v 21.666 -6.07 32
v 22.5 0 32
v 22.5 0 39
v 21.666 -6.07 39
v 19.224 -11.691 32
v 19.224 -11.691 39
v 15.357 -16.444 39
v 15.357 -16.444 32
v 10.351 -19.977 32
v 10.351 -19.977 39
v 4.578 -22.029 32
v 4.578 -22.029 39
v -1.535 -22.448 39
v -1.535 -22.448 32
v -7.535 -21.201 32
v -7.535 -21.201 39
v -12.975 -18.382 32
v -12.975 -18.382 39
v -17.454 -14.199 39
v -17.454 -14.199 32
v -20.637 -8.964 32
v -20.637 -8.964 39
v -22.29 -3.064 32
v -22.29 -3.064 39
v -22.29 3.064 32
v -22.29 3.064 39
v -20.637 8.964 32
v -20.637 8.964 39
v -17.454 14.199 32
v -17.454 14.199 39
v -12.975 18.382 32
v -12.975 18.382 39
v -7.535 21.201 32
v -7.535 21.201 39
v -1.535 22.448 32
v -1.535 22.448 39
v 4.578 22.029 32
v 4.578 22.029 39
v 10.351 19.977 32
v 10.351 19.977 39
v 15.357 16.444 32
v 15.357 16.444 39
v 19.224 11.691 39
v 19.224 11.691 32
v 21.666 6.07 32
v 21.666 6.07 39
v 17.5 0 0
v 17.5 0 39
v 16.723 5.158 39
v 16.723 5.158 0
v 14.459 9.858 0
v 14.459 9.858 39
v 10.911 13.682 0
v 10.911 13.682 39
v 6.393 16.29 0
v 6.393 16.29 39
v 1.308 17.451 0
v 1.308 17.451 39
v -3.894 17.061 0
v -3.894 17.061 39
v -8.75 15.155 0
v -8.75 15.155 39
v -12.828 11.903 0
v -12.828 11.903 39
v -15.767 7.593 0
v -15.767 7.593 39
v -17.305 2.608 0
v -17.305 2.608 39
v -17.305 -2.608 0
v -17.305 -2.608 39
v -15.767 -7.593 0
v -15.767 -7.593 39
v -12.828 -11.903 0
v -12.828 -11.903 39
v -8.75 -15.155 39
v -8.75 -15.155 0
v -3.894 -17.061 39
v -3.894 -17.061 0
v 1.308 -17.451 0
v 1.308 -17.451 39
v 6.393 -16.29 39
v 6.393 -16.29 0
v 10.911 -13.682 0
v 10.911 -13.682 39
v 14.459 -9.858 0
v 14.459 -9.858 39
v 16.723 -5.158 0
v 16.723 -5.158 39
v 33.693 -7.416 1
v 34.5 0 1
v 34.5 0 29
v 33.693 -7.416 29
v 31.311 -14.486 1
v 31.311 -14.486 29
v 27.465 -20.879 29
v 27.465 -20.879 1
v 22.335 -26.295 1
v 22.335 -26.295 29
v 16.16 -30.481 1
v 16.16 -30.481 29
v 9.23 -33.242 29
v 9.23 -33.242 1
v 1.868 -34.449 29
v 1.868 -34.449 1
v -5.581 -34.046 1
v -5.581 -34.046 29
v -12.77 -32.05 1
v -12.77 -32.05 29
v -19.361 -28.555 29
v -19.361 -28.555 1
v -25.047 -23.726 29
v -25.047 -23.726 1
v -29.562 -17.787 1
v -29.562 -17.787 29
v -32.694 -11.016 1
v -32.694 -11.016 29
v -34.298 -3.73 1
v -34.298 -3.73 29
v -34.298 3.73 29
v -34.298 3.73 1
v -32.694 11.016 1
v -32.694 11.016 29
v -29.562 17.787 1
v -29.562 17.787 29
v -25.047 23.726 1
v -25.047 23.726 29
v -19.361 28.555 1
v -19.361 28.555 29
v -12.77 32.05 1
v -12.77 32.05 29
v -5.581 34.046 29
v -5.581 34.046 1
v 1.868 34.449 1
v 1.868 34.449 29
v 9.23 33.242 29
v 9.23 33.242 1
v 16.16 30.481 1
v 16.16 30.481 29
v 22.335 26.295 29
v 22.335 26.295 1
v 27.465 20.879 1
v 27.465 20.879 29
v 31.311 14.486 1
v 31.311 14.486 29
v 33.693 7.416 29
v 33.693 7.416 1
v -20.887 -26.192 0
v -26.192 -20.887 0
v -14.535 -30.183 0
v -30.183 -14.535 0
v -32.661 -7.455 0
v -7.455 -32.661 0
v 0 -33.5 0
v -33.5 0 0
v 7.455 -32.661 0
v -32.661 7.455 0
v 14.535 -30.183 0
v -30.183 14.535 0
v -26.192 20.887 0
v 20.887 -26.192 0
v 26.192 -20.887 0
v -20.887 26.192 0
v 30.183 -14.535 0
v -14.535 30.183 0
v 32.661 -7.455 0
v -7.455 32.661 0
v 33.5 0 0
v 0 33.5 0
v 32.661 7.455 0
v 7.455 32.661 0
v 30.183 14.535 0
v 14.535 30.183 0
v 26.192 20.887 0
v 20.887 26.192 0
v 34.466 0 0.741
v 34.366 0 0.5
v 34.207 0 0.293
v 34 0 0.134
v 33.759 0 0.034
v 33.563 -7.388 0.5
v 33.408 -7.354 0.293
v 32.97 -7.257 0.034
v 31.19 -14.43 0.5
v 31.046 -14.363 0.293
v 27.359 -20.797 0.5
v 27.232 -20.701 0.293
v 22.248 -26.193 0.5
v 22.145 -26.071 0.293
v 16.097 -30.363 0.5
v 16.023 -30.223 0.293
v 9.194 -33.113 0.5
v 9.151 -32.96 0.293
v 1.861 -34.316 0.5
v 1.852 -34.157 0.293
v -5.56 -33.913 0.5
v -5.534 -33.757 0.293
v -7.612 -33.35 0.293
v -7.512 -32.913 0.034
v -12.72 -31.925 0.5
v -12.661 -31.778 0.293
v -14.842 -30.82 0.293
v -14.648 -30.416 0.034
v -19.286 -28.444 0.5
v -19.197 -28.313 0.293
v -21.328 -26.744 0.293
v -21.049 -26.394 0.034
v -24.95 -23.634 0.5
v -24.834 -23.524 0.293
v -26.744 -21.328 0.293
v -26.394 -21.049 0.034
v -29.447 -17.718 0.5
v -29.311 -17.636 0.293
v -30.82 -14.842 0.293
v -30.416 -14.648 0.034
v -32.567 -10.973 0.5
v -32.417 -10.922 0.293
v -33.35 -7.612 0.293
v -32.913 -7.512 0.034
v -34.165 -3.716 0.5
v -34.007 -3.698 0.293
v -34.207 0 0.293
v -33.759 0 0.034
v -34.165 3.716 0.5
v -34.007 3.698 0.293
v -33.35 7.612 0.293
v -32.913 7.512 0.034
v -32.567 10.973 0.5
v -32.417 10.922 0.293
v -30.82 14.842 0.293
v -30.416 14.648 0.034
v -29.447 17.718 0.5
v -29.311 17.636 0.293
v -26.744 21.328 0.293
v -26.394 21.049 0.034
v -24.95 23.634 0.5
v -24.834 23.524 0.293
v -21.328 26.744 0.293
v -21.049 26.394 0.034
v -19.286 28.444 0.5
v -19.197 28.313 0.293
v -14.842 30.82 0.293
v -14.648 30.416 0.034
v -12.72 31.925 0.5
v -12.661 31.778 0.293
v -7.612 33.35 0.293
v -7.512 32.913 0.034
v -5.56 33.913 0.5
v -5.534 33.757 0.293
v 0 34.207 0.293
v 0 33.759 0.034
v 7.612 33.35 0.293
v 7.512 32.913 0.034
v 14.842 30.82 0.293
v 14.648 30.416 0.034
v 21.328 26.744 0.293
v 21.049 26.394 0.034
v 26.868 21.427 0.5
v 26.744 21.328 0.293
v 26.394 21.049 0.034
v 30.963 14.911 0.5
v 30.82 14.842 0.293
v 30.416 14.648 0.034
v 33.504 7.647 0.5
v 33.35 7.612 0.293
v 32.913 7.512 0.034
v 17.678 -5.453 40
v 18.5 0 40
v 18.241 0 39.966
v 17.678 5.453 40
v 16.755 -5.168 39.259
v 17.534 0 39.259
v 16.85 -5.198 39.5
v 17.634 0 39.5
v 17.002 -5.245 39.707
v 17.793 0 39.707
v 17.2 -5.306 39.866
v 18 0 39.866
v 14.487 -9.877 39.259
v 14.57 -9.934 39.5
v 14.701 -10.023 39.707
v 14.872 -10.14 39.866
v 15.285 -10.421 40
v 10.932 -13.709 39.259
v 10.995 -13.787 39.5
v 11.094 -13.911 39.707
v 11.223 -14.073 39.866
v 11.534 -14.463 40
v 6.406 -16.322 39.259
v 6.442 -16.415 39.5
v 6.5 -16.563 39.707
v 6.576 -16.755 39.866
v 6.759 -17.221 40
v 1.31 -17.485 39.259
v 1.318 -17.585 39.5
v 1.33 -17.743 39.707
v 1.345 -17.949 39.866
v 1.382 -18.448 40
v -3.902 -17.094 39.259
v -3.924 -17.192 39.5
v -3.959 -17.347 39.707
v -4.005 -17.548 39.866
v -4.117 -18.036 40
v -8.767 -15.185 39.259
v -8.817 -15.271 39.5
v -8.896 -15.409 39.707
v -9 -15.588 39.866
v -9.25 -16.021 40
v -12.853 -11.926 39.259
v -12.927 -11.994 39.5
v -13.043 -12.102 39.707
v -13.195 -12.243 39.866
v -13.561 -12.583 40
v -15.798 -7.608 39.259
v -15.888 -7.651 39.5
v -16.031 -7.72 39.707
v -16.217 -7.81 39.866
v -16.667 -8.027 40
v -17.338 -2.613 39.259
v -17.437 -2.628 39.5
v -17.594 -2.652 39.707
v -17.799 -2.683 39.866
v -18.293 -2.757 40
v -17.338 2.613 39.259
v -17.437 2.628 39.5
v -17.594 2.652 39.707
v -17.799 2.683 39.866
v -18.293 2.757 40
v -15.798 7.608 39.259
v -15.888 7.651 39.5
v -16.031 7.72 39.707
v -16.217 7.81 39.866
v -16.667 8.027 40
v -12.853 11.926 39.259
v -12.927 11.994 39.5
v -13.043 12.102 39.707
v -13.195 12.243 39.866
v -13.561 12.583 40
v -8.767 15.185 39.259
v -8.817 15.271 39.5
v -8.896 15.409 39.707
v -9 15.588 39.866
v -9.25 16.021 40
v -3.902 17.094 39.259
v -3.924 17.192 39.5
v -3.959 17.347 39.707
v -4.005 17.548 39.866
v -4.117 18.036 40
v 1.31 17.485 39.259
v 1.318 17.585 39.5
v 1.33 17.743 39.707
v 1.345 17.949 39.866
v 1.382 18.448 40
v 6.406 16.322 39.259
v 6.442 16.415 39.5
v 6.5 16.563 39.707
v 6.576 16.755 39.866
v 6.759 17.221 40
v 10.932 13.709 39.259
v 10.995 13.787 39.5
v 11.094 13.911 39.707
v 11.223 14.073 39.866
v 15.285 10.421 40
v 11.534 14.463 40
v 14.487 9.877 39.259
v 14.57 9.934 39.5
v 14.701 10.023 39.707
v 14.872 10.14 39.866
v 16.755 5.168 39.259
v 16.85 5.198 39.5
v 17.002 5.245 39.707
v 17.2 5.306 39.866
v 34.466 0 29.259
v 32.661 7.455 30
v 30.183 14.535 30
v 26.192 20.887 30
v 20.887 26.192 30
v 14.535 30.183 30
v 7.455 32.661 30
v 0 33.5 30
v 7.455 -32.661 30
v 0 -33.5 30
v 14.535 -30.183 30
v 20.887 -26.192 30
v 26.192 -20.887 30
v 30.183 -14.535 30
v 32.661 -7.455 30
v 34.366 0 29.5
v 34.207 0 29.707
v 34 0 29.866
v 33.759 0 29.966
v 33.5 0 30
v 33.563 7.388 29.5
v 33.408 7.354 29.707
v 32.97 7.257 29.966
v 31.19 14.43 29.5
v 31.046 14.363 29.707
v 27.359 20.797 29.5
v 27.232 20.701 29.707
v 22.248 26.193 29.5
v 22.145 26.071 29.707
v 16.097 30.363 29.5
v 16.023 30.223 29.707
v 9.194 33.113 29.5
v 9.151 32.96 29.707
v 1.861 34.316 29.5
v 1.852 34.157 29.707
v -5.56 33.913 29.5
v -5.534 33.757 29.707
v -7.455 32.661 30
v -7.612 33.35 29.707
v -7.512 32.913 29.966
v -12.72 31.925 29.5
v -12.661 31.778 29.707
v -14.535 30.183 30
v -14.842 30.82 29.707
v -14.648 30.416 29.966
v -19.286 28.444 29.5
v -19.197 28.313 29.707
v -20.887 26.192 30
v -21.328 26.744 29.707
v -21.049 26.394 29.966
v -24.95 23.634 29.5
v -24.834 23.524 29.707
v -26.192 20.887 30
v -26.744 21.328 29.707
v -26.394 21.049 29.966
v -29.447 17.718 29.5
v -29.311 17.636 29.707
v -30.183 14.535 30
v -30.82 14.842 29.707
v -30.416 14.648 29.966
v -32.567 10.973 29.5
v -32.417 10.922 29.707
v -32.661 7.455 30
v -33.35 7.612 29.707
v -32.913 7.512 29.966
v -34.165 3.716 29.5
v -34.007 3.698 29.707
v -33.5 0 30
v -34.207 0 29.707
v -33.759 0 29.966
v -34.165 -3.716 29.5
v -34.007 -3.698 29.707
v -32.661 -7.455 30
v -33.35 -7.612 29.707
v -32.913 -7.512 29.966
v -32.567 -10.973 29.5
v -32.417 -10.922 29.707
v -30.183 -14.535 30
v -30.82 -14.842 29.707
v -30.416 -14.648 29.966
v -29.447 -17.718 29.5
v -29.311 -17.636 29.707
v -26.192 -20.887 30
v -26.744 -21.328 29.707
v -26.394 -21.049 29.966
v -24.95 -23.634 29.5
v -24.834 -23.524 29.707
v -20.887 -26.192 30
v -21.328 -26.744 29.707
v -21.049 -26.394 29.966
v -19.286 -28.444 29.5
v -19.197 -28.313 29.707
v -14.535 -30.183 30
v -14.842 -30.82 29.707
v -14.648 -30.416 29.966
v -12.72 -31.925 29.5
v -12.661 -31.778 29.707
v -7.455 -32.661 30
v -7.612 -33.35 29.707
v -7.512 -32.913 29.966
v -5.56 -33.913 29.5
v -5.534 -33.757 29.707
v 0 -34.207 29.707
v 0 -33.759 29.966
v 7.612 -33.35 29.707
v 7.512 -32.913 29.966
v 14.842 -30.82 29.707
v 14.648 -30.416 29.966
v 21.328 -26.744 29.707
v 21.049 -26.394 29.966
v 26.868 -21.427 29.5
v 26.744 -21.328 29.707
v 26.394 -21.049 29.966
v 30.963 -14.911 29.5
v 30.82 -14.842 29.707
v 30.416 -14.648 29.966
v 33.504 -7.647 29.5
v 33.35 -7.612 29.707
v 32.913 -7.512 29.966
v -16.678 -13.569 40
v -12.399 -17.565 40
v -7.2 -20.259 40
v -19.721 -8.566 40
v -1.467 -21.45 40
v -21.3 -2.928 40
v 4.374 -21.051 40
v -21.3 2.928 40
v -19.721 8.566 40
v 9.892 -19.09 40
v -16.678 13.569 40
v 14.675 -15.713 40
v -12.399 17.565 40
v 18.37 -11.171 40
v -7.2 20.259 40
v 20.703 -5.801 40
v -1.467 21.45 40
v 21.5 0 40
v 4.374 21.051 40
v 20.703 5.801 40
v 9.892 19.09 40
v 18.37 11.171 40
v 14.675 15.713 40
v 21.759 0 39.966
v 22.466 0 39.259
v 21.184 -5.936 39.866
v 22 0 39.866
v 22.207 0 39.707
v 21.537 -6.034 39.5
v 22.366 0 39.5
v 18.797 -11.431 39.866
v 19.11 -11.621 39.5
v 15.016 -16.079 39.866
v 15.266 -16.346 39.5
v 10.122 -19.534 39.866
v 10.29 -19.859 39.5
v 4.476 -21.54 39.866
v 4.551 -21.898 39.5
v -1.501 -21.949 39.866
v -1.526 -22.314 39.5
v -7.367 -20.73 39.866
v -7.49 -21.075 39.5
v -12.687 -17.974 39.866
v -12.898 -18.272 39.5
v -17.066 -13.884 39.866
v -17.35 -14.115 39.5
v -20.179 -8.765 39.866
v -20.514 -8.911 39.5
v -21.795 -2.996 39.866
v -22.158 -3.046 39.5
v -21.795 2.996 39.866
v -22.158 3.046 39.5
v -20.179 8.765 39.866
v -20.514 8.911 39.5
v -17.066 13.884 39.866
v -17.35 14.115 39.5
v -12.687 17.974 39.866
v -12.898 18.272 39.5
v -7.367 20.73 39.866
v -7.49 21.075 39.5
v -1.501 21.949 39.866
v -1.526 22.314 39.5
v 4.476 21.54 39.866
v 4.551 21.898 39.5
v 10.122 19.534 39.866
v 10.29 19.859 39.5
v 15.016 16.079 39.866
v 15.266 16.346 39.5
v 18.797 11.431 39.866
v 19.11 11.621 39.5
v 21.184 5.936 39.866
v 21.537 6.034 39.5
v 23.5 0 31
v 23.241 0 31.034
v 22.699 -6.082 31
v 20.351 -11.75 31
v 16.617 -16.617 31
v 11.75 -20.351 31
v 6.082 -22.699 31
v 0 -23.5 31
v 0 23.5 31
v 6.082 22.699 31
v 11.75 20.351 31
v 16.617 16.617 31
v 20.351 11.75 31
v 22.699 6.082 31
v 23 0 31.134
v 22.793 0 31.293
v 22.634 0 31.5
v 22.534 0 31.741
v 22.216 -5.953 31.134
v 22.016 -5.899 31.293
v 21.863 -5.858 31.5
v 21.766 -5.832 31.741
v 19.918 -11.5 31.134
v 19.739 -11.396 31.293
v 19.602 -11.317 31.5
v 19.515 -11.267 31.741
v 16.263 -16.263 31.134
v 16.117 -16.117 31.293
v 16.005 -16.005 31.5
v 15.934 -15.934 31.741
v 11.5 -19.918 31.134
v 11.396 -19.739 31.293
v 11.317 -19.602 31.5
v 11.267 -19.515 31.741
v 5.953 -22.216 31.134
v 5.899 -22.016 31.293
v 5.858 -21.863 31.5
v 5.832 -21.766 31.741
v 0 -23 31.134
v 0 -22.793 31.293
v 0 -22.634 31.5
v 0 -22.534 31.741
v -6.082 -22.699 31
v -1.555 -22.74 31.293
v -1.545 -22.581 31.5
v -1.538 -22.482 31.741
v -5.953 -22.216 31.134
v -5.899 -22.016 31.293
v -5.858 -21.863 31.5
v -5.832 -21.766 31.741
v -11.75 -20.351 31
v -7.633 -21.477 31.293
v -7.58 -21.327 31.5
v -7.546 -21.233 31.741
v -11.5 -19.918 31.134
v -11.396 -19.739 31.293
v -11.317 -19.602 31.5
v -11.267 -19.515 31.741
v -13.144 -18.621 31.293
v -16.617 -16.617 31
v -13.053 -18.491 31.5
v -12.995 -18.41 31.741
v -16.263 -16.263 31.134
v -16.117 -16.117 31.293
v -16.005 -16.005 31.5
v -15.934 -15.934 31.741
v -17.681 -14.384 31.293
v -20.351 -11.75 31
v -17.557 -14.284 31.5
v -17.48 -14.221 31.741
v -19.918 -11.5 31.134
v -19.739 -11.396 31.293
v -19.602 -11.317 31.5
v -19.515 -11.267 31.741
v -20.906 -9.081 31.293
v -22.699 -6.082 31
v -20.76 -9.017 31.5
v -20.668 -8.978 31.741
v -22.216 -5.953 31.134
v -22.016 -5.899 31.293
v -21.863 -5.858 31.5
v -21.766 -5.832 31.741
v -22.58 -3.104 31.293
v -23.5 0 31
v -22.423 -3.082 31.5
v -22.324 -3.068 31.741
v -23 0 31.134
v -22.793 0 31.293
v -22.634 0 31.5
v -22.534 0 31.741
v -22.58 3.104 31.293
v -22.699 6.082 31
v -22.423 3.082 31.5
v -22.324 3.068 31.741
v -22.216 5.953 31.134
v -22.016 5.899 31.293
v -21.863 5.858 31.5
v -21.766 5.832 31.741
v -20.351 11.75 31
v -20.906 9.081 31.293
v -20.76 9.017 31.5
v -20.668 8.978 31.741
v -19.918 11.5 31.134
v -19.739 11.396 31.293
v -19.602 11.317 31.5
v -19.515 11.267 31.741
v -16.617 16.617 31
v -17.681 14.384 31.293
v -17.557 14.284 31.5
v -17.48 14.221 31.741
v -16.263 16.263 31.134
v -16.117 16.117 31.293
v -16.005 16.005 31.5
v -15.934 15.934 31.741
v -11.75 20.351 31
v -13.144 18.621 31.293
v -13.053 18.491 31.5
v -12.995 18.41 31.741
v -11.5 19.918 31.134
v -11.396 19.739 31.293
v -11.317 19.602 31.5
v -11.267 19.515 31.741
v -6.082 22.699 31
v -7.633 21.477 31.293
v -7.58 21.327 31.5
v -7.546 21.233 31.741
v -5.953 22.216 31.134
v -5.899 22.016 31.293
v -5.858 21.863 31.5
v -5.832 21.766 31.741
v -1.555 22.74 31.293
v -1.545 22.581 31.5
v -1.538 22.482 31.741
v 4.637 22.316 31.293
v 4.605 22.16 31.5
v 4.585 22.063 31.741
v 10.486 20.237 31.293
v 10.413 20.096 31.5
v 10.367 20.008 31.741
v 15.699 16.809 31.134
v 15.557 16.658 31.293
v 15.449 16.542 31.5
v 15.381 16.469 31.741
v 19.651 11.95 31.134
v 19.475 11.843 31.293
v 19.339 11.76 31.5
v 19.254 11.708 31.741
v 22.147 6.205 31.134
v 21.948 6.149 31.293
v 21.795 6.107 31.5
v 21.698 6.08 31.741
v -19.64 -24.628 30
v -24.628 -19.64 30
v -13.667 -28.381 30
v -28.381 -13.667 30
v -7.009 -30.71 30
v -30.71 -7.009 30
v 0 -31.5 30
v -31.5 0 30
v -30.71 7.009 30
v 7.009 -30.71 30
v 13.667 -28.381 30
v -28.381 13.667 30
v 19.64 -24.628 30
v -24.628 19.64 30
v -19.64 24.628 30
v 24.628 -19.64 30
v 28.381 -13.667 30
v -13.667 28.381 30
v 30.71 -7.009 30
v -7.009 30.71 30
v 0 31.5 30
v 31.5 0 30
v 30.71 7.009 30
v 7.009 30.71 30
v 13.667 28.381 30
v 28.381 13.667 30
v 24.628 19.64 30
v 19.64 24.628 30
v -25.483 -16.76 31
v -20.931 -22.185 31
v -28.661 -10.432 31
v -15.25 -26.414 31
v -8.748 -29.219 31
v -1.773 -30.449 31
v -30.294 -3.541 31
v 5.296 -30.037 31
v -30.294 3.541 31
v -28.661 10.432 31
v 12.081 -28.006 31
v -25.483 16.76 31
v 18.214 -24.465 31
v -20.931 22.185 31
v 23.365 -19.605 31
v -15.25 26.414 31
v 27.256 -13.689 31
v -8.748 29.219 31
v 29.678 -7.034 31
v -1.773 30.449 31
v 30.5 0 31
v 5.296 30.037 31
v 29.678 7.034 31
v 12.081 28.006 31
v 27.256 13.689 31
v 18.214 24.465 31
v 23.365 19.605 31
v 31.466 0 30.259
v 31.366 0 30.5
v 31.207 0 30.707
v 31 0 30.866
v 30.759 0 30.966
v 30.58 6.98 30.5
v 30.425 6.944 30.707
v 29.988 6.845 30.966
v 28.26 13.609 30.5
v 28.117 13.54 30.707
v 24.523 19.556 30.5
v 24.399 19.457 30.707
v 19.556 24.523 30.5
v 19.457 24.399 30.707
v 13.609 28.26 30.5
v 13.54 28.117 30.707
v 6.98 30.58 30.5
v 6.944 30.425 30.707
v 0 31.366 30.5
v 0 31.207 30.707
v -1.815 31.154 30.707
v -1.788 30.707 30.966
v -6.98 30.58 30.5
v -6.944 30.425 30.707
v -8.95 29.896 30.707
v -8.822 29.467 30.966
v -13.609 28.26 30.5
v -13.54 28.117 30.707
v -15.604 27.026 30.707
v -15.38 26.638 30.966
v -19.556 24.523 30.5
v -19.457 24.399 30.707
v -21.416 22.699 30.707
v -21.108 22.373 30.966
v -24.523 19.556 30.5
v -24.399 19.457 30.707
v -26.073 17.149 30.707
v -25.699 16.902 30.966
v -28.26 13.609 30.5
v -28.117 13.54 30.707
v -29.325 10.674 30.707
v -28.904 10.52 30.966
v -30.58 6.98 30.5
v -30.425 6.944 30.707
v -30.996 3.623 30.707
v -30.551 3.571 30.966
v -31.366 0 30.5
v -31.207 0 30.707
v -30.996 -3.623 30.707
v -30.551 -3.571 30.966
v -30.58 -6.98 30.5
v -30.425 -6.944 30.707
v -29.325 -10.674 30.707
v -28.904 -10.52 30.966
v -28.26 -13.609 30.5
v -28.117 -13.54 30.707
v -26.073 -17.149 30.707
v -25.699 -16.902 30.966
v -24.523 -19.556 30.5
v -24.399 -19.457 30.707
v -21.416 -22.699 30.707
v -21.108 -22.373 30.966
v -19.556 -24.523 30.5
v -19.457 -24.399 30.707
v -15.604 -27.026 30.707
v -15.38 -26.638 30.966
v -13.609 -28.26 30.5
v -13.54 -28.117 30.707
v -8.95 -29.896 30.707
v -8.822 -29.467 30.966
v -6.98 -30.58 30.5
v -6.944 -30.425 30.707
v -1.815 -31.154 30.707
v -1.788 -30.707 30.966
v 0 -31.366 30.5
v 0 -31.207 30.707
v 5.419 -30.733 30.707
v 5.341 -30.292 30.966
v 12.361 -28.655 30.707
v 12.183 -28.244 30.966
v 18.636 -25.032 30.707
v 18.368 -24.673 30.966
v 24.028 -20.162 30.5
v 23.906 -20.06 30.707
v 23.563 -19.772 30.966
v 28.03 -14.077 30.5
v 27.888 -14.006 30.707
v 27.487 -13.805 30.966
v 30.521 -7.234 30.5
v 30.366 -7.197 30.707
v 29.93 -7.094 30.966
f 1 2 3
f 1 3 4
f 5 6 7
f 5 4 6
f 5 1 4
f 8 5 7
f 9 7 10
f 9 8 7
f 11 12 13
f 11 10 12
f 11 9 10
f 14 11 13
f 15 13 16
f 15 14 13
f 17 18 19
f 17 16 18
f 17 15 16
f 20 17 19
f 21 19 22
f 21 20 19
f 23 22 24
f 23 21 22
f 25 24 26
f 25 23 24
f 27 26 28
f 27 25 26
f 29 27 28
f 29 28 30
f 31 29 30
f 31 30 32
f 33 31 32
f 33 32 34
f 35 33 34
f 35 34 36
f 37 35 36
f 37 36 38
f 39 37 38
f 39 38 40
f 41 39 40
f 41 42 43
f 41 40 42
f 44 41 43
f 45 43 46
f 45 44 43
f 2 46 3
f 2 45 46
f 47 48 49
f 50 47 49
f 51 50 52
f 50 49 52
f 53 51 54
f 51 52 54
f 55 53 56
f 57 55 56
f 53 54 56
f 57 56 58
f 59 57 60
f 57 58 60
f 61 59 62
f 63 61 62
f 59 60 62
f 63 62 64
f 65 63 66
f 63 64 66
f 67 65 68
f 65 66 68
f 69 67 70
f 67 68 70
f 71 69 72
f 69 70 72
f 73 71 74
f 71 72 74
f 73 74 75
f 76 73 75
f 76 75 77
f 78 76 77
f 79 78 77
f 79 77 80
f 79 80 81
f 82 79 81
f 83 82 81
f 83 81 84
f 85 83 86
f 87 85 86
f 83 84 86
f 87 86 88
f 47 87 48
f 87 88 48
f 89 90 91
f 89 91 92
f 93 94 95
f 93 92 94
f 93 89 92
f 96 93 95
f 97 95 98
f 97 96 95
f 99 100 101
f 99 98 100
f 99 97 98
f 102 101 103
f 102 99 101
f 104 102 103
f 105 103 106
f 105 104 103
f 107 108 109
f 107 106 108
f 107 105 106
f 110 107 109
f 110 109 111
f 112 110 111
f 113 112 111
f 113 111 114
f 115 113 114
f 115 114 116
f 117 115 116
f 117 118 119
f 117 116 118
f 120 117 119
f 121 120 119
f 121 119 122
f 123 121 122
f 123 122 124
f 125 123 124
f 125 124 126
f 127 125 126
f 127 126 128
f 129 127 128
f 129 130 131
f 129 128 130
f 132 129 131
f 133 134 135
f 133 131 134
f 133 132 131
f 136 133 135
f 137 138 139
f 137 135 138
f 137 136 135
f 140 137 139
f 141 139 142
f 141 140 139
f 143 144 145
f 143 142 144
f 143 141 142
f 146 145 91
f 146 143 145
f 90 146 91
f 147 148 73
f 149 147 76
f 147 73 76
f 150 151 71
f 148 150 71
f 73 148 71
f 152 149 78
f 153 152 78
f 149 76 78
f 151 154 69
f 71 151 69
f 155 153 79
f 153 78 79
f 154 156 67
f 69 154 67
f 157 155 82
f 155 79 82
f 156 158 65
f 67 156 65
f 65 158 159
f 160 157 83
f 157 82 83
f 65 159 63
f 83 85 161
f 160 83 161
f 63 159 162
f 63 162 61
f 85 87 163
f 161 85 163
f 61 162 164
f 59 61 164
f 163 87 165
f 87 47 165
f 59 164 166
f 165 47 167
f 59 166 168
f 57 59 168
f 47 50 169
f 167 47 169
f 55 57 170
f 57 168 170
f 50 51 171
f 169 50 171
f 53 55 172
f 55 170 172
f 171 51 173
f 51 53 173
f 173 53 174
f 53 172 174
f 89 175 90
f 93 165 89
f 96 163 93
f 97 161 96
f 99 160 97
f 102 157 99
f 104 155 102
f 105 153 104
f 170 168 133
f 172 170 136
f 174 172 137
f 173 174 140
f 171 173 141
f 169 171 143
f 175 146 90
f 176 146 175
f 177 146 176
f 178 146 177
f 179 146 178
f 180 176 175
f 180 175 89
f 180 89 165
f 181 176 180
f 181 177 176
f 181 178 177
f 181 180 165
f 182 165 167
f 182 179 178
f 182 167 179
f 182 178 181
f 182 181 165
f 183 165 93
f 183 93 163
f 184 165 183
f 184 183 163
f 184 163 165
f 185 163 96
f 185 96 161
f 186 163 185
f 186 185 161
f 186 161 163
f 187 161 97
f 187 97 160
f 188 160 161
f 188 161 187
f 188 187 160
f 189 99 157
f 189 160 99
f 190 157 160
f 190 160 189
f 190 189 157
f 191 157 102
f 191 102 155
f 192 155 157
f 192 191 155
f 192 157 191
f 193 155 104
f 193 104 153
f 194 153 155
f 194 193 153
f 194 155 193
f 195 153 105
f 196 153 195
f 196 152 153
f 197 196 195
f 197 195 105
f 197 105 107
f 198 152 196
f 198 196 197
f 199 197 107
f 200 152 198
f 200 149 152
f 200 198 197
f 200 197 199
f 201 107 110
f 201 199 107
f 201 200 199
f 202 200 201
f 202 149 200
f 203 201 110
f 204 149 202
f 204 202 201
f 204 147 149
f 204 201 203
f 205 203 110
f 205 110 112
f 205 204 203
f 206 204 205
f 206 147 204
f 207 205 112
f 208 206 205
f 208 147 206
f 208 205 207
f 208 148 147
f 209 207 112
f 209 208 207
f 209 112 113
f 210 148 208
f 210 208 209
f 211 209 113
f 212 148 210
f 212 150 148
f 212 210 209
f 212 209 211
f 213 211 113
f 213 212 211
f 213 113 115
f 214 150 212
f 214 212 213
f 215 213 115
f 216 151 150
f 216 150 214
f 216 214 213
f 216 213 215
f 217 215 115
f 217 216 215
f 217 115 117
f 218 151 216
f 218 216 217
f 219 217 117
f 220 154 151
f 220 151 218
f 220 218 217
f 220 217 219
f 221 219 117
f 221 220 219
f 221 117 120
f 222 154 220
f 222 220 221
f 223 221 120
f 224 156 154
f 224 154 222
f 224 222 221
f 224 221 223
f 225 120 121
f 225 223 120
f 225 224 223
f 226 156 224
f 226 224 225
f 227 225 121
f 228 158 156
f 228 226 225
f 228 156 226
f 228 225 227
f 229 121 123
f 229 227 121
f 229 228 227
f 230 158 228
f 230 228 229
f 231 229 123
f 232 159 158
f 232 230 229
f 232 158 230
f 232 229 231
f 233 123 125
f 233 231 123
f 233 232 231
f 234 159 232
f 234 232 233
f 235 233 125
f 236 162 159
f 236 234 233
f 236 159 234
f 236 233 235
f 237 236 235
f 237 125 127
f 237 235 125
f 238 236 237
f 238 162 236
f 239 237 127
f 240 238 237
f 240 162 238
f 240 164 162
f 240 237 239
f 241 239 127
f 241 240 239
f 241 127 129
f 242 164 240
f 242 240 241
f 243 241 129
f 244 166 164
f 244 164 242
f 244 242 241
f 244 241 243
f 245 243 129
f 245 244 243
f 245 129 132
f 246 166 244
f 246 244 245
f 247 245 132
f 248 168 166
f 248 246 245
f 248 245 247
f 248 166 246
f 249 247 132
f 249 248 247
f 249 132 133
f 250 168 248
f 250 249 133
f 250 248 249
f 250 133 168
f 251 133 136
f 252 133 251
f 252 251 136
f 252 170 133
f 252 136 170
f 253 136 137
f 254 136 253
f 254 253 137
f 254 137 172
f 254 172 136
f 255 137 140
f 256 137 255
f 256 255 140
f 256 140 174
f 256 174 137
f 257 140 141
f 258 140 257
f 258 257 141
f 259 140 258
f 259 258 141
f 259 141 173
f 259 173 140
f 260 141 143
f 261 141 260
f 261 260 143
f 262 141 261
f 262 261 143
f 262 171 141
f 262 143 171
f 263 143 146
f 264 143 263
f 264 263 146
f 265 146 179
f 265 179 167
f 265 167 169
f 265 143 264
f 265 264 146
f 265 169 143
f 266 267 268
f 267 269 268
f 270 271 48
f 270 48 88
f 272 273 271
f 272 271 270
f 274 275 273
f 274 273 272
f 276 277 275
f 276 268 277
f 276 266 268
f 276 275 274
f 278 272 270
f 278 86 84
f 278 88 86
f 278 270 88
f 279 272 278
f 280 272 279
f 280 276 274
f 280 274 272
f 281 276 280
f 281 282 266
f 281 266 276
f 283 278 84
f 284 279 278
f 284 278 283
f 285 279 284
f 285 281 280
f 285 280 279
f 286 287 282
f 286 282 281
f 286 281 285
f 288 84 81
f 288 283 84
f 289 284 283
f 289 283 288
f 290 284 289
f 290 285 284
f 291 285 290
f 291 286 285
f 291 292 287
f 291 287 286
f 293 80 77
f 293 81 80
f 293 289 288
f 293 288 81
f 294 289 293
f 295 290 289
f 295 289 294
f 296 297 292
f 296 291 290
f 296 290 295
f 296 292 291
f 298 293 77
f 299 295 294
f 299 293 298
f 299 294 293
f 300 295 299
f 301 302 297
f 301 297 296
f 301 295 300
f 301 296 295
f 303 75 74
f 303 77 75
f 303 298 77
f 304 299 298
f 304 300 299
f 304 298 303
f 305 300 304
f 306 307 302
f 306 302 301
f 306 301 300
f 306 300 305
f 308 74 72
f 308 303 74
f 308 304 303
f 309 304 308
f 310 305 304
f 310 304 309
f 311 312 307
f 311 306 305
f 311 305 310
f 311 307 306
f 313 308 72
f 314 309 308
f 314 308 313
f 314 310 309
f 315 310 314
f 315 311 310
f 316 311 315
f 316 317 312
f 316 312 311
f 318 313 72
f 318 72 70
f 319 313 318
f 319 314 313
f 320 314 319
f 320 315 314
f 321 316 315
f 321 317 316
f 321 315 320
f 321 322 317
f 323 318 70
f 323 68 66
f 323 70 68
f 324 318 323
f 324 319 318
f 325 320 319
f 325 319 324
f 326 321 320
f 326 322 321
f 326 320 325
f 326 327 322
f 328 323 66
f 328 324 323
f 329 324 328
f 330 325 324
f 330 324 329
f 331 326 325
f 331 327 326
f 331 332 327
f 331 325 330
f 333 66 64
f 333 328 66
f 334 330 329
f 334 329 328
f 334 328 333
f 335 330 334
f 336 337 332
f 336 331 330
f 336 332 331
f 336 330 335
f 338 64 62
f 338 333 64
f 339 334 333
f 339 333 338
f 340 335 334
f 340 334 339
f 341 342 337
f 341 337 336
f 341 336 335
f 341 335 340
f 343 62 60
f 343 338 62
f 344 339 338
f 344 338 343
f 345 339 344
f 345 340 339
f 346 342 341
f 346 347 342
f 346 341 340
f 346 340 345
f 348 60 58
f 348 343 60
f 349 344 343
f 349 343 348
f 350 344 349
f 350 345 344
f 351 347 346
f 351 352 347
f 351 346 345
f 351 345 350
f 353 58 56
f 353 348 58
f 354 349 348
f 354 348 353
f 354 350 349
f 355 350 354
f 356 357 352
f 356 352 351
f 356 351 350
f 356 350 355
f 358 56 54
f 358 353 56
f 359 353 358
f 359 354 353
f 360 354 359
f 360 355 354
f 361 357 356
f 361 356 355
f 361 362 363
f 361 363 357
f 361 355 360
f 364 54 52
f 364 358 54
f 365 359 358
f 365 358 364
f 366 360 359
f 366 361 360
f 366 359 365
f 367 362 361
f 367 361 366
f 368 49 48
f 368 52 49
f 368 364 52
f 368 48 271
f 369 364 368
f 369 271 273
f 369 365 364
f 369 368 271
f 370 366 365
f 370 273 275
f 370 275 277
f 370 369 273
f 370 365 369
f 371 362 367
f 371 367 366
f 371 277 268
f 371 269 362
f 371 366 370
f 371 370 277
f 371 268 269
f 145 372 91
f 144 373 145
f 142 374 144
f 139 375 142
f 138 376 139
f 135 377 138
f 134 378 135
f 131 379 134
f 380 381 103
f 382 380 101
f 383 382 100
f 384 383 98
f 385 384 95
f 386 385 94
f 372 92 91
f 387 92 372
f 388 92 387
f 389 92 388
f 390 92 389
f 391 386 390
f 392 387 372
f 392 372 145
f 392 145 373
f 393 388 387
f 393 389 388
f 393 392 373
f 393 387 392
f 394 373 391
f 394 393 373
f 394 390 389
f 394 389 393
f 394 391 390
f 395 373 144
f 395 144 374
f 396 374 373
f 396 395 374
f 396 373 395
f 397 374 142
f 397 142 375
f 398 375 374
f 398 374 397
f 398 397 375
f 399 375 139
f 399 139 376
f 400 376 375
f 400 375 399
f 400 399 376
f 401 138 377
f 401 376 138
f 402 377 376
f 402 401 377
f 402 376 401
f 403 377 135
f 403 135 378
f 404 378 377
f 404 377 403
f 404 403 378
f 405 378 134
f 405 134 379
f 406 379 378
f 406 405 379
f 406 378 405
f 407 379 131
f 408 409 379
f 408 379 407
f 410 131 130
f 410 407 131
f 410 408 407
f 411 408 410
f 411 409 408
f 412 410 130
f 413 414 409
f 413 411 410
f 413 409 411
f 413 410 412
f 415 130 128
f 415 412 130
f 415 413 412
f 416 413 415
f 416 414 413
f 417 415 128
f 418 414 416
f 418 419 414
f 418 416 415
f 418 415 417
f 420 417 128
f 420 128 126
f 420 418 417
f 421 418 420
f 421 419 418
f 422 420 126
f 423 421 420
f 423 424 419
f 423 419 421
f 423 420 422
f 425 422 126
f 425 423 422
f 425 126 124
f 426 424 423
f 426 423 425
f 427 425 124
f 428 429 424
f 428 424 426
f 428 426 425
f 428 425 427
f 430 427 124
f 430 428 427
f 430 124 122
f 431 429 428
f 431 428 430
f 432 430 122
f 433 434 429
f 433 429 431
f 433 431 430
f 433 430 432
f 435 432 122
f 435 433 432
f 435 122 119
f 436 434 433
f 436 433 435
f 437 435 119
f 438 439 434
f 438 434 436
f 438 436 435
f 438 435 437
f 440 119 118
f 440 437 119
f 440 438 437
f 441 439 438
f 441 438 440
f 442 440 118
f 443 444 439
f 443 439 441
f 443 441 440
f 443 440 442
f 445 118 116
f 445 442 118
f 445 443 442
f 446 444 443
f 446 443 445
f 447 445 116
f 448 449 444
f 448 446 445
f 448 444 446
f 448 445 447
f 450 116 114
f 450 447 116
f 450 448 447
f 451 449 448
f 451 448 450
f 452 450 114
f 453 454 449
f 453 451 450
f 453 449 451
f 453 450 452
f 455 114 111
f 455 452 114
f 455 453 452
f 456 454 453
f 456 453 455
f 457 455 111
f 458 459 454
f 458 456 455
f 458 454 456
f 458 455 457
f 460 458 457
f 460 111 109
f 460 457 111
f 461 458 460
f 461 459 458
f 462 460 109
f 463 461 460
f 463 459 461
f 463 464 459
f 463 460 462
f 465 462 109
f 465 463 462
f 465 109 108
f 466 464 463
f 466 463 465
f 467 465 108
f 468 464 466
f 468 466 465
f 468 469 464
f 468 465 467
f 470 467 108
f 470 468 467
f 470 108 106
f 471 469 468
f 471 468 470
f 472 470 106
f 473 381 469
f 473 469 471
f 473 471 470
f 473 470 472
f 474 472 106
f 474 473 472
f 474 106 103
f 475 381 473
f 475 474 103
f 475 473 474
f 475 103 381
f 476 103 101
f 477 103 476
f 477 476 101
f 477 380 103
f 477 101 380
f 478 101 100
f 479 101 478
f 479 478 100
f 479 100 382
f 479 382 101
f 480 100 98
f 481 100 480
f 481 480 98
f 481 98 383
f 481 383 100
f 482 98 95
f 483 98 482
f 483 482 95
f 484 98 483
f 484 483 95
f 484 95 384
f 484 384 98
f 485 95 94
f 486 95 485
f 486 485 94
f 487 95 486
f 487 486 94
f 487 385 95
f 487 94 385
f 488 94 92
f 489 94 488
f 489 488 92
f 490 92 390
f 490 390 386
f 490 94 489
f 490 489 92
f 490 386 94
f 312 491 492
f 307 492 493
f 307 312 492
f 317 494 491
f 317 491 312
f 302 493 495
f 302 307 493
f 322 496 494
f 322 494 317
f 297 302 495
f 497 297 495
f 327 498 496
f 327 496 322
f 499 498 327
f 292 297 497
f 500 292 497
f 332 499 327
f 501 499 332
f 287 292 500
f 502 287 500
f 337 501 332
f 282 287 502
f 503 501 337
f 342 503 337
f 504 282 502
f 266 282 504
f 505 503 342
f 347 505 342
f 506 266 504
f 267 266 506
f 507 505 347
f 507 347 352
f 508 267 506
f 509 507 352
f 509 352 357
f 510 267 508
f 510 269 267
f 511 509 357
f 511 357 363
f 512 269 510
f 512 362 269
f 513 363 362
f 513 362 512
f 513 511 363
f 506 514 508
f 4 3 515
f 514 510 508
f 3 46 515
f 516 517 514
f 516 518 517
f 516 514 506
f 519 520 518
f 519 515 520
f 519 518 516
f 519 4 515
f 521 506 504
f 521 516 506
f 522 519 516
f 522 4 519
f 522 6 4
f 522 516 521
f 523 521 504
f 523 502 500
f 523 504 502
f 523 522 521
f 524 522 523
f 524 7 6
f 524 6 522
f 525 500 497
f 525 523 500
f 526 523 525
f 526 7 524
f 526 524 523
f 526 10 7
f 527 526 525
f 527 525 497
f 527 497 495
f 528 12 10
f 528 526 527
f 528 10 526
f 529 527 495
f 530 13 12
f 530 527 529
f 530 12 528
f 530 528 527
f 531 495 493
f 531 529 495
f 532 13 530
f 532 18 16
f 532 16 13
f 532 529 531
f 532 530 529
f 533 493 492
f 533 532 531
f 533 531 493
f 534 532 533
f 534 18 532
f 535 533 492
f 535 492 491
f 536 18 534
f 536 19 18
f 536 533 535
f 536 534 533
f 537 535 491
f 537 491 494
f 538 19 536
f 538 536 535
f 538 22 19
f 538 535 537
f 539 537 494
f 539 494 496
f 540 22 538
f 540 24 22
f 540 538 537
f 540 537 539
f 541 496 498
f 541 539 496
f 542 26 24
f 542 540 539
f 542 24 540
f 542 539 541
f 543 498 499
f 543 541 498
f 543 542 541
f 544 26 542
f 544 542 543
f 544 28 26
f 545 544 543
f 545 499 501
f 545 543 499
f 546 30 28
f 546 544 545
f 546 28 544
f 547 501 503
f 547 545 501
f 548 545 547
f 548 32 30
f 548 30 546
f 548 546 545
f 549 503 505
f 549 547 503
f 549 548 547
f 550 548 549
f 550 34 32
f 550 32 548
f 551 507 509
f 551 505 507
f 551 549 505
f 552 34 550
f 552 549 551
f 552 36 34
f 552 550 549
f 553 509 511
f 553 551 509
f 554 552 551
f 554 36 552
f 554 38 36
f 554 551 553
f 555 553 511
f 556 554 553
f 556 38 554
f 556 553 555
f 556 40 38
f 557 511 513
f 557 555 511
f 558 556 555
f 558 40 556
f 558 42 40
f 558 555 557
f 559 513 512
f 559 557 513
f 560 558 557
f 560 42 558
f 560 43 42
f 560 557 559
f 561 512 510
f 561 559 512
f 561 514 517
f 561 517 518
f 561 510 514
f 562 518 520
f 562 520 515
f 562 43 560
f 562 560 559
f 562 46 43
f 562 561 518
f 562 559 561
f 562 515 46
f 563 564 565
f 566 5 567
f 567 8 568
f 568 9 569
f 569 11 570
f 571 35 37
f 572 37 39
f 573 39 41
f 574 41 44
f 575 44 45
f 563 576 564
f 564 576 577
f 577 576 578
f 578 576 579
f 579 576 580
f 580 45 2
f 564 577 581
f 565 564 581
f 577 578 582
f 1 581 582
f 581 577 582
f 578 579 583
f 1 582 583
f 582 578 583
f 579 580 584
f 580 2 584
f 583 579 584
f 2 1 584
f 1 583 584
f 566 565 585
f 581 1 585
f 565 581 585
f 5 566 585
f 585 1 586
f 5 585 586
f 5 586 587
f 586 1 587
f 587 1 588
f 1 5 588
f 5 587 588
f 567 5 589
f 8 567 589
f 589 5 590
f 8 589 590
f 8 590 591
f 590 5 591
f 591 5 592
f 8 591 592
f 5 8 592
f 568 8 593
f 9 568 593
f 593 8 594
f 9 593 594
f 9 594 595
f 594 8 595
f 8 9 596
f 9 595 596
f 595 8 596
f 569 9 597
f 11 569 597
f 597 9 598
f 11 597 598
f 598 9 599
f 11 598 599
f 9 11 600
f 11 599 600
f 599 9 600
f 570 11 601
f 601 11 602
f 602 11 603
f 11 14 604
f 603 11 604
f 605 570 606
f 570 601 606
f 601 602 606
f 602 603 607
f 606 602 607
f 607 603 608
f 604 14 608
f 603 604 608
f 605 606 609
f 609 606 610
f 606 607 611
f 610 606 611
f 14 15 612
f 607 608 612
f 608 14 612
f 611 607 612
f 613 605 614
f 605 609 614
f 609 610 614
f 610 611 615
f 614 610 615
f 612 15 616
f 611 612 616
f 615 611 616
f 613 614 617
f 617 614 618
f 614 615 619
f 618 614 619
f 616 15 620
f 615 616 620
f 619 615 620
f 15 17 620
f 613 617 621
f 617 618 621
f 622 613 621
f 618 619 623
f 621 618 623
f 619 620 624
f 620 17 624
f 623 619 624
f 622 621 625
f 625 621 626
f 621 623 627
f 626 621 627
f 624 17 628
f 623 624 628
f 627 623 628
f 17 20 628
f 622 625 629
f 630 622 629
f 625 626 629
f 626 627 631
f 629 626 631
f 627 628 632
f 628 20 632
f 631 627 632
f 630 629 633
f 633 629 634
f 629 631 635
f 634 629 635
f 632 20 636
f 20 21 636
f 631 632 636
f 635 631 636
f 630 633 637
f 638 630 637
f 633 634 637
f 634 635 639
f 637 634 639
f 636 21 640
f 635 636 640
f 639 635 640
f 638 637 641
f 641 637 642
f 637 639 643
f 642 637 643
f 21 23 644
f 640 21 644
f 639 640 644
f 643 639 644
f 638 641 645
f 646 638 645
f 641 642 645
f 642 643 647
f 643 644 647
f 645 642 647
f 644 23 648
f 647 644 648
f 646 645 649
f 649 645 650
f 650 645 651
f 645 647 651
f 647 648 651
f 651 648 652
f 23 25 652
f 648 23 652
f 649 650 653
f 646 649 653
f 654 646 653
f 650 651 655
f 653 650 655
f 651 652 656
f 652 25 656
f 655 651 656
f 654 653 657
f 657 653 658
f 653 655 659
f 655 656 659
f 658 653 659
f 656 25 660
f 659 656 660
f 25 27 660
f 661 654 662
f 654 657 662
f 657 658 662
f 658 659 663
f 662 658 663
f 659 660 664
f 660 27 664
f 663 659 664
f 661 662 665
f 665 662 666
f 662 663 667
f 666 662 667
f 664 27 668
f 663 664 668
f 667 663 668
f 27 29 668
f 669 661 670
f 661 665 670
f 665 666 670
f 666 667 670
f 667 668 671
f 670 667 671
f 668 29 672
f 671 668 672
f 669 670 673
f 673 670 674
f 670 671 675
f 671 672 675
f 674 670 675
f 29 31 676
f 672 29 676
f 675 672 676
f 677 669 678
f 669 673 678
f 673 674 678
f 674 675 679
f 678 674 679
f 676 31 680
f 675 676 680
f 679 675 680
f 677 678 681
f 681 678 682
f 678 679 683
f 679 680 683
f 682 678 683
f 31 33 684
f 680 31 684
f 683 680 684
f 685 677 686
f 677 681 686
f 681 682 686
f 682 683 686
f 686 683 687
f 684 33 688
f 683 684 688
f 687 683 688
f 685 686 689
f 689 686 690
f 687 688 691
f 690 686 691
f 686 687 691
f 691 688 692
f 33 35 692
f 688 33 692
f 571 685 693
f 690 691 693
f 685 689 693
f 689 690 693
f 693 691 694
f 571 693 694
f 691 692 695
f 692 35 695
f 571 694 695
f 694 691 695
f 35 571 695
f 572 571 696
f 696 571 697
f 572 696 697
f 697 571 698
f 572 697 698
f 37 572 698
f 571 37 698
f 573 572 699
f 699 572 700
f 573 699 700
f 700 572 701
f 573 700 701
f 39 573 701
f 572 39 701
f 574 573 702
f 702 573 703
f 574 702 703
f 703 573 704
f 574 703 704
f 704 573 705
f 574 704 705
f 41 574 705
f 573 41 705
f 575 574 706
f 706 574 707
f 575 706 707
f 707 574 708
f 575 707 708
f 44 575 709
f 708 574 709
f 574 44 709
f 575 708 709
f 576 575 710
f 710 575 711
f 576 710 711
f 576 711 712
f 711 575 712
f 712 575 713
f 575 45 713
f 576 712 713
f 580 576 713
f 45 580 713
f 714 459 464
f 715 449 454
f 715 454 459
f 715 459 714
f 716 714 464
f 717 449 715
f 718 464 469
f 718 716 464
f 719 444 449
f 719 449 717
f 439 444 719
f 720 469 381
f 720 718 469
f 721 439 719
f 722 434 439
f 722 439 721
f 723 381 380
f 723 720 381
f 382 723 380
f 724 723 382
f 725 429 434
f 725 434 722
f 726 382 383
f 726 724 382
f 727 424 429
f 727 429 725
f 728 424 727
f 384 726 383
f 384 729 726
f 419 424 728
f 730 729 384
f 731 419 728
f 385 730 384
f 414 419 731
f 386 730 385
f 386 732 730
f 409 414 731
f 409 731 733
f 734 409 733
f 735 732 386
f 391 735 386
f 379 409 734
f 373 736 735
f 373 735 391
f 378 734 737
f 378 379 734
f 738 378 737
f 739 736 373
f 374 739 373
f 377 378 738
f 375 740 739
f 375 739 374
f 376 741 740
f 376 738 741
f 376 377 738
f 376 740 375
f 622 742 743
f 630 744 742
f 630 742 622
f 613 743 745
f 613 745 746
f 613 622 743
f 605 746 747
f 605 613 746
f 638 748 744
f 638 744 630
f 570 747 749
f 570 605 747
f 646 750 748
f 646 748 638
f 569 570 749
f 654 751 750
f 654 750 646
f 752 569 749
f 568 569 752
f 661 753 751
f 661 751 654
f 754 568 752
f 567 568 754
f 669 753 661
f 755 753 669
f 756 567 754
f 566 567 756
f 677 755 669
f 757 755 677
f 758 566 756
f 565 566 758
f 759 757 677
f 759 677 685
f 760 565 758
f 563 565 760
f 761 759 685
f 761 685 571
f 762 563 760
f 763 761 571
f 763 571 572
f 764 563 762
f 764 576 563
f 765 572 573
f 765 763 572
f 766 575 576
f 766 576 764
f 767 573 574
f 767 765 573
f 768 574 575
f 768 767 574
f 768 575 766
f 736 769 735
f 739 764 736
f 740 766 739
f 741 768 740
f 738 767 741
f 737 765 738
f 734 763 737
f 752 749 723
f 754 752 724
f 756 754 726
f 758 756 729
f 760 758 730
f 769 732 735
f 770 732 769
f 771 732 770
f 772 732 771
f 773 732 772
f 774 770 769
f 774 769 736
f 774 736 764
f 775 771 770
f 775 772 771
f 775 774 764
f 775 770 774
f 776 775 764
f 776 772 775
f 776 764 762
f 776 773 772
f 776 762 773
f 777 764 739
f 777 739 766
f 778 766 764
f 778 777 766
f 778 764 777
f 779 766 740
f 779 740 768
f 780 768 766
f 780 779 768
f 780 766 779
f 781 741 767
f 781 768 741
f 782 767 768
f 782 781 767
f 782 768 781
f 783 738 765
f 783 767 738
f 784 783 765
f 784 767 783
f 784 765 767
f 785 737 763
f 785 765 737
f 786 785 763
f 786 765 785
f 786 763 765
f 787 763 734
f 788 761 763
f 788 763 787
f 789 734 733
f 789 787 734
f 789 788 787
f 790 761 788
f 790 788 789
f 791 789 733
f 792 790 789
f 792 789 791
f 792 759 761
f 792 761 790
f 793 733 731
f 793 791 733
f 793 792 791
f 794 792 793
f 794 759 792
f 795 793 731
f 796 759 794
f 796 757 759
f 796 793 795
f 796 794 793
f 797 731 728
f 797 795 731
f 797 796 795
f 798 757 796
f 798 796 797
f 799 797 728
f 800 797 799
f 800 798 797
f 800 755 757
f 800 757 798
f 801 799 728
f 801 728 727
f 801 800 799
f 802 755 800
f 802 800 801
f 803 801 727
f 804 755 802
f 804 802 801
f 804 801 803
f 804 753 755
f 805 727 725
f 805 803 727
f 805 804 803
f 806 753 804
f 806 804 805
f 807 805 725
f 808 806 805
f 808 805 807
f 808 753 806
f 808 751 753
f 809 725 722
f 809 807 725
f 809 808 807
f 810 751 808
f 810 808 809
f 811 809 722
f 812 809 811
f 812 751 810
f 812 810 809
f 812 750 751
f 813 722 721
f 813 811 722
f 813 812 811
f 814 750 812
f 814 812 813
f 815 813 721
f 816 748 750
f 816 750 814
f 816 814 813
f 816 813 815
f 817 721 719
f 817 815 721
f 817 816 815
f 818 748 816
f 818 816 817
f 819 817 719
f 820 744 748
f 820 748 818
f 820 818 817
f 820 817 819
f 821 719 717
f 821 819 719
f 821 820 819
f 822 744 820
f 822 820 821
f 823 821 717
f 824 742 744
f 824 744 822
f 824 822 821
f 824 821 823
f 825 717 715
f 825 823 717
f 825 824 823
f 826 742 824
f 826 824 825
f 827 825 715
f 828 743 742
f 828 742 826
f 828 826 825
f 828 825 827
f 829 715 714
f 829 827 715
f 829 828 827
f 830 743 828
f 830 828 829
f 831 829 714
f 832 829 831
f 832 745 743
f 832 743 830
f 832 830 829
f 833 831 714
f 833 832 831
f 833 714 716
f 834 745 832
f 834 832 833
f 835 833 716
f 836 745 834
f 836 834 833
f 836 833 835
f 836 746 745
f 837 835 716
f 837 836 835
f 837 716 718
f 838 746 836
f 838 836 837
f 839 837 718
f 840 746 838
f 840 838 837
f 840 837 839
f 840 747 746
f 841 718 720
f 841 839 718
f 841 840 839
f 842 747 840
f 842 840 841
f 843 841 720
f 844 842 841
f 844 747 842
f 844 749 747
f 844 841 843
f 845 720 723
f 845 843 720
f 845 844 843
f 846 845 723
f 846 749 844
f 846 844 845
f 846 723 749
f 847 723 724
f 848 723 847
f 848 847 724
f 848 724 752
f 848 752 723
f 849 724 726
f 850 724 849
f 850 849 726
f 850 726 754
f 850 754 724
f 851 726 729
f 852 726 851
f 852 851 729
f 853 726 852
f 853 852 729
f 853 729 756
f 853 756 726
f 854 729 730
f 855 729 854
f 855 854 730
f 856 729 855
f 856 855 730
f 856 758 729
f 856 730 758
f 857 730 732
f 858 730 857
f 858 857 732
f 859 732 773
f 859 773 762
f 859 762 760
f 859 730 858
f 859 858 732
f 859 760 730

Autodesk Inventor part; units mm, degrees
ref_plane "YZ Plane" through (0, 0, 0) normal (1, 0, 0) x (0, 1, 0)
ref_plane "XZ Plane" through (0, 0, 0) normal (0, 1, 0) x (-1, 0, 0)
ref_plane "XY Plane" through (0, 0, 0) normal (0, 0, 1) x (1, 0, 0)
sketch "Sketch1" plane through (0, 0, 0) normal (0, 0, 1) x (1, 0, 0)
  circle A0 centre (0, 0) radius 34.5
  dimension "d0" = 69
sketch "Sketch2" plane through (0, 0, 0) normal (0, 0, 1) x (1, 0, 0)
  point P0 (0, 0)
extrude "Extrusion1" add sketch "Sketch1" along normal blind 30
sketch "Sketch3" plane through (0, 0, 30) normal (0, 0, 1) x (1, 0, 0)
  circle A0 centre (0, 0) radius 31.5
  dimension "d3" = 63
extrude "Extrusion2" add sketch "Sketch3" along normal blind 1
sketch "Sketch4" plane through (0, 0, 31) normal (0, 0, 1) x (1, 0, 0)
  circle A0 centre (0, 0) radius 22.5
  dimension "d6" = 45
extrude "Extrusion3" add sketch "Sketch4" along normal blind 9
sketch "Sketch5" plane through (0, 0, 40) normal (0, 0, 1) x (1, 0, 0)
  circle A0 centre (0, 0) radius 17.5
  dimension "d9" = 35
extrude "Extrusion4" cut sketch "Sketch5" against normal blind 110
fillet "Fillet1" radius 1 6 edges at (-17.5, 0, 40) (-22.5, 0, 40) (-22.5, 0, 31) (-34.5, 0, 30) (-34.5, 0, 0) (-31.5, 0, 31)
sketch "Sketch6" plane through (0, 0, 0) normal (1, 0, 0) x (0, 1, 0)
  point P0 (0, 0)
properties part number "project flange bearing part2" material "Stainless Steel AISI 440C, Welded"
